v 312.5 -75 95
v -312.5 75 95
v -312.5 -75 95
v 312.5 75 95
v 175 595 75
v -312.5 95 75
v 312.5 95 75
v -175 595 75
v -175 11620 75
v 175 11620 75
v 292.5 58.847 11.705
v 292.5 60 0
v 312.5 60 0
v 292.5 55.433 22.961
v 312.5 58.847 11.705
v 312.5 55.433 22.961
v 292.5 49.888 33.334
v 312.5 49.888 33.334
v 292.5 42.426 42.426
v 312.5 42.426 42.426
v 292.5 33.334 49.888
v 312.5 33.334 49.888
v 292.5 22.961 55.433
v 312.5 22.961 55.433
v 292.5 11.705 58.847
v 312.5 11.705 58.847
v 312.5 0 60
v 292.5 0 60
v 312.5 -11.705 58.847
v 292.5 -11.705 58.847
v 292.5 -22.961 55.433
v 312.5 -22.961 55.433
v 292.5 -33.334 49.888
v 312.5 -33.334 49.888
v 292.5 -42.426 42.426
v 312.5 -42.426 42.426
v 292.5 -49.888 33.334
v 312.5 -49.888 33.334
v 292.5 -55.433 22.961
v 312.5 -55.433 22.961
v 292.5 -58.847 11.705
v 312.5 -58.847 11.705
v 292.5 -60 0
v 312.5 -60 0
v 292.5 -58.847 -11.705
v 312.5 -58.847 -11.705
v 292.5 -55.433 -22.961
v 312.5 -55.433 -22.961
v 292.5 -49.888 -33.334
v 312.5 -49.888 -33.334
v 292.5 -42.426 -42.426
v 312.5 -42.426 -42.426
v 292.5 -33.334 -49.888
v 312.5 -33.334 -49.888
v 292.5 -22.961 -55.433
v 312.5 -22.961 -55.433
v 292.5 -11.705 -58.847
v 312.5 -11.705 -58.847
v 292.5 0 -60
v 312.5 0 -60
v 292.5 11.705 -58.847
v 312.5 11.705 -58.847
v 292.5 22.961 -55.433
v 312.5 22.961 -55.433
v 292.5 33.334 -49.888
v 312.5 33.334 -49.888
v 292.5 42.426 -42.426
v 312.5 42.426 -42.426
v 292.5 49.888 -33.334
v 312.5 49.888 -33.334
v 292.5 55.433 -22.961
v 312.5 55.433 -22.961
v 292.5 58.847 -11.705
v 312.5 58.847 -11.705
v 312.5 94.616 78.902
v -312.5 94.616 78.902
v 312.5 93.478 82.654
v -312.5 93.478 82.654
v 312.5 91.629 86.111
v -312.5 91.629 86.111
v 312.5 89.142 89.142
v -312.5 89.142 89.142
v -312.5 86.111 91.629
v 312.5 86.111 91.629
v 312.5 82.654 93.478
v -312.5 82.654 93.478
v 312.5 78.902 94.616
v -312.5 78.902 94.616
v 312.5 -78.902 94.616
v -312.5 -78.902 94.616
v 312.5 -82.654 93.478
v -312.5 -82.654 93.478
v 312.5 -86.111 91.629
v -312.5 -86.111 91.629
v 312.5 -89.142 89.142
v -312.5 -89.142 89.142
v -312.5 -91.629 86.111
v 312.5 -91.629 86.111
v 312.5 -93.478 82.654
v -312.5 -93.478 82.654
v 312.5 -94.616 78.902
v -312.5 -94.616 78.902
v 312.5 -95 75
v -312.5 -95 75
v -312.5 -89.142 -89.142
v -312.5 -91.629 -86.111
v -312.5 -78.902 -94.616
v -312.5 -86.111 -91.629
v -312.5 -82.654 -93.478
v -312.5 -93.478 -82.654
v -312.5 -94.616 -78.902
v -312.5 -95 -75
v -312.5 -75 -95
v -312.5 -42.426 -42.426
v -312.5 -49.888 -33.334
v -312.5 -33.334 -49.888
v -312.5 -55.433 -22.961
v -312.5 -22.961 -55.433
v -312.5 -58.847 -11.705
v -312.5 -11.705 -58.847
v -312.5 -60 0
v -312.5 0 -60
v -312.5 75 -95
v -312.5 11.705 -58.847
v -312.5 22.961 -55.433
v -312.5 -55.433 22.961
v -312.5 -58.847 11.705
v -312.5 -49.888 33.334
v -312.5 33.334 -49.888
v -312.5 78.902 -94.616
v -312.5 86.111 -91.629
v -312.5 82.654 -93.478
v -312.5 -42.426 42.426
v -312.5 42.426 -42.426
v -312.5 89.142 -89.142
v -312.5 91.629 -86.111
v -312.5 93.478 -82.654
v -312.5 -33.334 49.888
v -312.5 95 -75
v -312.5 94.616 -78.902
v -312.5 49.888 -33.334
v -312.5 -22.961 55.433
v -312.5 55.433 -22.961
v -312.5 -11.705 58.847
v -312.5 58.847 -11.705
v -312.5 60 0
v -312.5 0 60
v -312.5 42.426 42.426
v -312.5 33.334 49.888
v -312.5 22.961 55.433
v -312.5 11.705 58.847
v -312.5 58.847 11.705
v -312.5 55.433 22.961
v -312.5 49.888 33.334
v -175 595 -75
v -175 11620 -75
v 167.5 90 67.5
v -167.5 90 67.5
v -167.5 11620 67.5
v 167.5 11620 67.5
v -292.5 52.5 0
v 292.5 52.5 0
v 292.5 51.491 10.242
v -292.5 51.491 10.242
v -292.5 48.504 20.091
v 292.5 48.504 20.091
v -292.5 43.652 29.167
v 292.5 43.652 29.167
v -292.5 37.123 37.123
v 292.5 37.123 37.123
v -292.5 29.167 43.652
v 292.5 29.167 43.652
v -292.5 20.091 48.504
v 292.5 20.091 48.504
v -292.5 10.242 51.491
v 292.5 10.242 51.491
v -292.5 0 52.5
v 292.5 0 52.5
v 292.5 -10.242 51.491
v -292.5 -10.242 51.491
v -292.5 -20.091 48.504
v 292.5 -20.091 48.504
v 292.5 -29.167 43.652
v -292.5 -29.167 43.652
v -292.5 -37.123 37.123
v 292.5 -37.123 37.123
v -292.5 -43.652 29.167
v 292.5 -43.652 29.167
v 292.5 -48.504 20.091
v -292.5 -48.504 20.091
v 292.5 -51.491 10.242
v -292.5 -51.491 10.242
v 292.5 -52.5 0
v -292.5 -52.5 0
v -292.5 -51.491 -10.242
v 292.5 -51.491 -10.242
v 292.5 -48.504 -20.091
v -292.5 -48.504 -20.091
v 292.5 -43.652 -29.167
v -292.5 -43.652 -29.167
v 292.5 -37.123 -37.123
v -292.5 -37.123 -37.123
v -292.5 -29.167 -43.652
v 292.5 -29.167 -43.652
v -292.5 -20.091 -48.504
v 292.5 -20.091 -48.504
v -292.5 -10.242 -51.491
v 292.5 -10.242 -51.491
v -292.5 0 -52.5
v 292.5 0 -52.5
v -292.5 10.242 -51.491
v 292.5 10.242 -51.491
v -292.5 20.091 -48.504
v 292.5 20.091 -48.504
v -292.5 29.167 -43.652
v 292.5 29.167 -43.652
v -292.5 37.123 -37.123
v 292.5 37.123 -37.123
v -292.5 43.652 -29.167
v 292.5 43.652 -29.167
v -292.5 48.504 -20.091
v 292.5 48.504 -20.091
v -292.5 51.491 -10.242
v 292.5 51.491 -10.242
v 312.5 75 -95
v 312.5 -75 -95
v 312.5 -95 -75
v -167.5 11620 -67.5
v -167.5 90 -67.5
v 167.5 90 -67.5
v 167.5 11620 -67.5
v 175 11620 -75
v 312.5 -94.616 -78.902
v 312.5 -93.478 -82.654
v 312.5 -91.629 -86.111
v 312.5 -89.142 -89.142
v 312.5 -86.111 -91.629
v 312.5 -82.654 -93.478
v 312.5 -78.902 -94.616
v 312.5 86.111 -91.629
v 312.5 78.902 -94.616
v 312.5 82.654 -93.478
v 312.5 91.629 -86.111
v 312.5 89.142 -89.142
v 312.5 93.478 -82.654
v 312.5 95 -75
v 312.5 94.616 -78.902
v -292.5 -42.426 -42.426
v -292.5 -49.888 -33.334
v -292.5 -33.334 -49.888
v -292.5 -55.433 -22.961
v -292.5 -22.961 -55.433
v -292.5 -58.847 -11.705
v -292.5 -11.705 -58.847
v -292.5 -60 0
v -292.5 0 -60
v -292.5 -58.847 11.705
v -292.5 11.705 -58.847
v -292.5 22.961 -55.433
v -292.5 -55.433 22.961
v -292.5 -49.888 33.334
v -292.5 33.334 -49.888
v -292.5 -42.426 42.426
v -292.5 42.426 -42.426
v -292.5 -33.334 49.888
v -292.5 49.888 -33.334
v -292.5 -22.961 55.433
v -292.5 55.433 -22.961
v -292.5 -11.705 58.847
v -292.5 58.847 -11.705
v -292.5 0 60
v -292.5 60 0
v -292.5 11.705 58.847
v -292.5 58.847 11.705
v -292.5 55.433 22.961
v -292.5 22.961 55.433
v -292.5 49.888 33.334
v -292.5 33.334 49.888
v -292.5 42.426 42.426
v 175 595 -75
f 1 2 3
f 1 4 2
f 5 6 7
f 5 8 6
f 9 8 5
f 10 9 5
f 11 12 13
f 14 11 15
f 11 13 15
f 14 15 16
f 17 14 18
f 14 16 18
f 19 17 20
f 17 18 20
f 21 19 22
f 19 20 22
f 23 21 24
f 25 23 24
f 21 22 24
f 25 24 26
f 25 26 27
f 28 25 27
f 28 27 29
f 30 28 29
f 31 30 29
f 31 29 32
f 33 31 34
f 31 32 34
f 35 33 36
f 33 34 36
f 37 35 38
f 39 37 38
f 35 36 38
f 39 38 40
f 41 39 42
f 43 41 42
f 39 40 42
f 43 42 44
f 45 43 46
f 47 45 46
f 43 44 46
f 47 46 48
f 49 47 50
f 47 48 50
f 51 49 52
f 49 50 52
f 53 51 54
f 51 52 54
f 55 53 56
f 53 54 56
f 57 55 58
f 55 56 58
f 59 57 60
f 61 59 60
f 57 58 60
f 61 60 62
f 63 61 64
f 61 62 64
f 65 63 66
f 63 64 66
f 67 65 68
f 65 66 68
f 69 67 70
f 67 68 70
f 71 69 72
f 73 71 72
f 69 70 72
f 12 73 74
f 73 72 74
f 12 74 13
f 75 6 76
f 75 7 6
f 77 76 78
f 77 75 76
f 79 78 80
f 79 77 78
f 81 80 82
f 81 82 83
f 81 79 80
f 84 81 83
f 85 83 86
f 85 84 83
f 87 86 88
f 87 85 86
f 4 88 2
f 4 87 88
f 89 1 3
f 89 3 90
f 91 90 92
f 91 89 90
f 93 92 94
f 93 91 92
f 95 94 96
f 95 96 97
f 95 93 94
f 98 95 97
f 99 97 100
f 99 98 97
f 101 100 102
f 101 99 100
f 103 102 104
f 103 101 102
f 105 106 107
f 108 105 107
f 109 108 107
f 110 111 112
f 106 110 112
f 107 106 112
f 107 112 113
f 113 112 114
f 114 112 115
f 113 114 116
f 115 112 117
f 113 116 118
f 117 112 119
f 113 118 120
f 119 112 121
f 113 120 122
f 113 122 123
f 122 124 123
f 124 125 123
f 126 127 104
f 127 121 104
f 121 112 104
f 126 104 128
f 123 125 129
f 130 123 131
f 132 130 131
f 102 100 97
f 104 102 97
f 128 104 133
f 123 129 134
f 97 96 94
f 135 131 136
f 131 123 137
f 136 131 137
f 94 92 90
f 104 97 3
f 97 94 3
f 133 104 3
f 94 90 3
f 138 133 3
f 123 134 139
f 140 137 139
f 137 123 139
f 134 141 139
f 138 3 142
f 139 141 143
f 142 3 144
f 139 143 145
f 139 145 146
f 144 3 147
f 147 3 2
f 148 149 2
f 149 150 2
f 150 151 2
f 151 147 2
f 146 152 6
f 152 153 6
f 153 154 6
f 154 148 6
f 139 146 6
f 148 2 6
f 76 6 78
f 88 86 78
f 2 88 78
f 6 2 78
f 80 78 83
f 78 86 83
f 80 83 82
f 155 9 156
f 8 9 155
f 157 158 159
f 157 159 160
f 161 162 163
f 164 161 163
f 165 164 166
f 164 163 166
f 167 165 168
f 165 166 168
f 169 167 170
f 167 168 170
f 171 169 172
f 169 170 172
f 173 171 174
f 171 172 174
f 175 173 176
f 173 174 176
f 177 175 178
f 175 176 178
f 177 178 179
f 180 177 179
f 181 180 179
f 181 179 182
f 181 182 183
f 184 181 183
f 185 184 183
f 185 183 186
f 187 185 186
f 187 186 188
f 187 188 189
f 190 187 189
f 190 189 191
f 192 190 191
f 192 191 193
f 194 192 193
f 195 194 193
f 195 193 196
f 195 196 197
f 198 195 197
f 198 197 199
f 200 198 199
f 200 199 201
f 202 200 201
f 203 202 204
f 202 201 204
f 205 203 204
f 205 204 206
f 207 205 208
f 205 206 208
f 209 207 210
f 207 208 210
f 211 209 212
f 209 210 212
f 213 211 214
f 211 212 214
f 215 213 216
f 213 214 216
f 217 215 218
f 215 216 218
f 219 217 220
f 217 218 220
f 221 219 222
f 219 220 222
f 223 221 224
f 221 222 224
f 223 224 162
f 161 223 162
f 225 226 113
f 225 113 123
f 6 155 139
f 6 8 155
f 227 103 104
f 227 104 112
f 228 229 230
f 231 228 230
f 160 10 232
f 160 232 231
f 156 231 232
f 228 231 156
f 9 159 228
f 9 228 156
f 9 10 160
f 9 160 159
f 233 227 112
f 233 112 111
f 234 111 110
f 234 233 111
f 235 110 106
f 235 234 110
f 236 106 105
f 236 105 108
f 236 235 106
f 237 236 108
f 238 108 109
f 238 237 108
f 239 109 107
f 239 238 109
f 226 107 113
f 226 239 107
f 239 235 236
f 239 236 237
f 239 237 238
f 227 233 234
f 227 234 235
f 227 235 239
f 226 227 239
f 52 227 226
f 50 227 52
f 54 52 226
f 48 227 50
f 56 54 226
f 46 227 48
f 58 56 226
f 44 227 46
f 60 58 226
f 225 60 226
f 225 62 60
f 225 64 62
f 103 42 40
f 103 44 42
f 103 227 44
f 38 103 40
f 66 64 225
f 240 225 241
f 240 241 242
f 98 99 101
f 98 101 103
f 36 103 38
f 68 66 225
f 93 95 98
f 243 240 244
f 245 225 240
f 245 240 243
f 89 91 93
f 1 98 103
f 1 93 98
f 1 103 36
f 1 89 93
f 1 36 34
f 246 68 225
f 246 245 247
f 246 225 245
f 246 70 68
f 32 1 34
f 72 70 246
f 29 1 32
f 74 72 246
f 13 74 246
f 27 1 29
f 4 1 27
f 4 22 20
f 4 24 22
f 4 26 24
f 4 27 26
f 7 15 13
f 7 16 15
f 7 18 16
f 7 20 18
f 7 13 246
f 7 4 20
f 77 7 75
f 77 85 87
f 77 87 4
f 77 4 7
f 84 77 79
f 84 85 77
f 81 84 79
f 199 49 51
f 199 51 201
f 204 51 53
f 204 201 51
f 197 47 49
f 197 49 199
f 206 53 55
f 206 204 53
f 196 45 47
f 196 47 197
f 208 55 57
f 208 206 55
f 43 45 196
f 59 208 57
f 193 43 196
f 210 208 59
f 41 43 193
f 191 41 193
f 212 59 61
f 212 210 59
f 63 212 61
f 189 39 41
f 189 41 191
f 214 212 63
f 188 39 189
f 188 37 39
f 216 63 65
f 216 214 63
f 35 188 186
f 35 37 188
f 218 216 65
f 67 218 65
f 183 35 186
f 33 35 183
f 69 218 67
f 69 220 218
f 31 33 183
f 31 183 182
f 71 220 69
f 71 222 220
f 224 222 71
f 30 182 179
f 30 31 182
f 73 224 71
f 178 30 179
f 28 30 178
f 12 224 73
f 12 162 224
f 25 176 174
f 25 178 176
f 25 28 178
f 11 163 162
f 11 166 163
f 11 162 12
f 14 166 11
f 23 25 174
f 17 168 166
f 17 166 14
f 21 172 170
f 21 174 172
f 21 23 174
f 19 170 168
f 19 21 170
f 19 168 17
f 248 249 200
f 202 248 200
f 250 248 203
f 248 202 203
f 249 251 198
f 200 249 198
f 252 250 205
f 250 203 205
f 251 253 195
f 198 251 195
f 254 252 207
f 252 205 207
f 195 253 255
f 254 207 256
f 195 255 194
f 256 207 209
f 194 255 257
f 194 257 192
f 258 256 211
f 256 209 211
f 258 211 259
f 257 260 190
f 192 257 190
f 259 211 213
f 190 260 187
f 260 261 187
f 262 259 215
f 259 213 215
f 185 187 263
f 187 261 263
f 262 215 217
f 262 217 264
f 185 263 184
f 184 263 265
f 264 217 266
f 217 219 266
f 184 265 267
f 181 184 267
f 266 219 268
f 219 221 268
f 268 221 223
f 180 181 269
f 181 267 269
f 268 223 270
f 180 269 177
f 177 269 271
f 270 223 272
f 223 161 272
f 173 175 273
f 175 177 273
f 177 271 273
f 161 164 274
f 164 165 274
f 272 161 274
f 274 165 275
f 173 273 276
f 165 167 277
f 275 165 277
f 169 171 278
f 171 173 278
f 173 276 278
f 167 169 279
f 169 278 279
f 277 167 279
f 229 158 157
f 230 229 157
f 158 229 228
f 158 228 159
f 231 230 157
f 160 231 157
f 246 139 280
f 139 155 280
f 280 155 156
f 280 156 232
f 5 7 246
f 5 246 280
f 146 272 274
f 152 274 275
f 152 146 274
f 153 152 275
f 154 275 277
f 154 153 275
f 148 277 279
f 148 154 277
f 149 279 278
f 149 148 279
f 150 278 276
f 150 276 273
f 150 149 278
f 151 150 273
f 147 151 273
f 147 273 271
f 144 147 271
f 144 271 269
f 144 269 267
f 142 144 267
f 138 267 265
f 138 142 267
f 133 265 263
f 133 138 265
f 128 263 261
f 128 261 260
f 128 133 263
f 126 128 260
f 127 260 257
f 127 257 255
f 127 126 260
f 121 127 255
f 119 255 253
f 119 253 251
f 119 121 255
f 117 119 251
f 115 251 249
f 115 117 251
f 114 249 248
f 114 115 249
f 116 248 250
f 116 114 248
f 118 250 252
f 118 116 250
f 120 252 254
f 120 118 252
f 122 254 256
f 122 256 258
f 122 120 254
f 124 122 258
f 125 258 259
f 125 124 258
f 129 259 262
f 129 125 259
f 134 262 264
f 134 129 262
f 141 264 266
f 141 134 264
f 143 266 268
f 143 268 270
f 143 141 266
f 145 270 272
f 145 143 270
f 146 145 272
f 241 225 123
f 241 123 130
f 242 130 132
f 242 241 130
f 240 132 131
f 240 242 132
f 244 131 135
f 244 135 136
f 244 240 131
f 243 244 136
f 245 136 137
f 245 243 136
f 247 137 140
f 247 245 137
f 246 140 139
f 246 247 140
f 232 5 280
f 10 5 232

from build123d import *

# Parameters (mm, degrees)
F0_R     = 60
F0_R_2   = 53.033
F1_DEPTH = 312.5
F2_R     = 52.5
F3_DEPTH = 625.001
F2_R_2   = 60
F4_DEPTH = 20
F6_DEPTH = 75
F8_W     = 335
F8_H     = 135
F9_DEPTH = 11530.001


# Not quite as in the source:
# - a pattern or mirror of a feature is missing from the dataset's text; its kind, count and spacing are read off the source's solid


with BuildPart() as f1:
    # F0 (on Right) → F1 (new body, symmetric)
    with BuildSketch(Plane.YZ):
        with BuildLine():
            Line((75, 95), (-75, 95))
            ThreePointArc((-75, 95), (-89.1421356237, 89.1421356237), (-95, 75))
            Line((-95, 75), (-95, -75))
            ThreePointArc((-95, -75), (-89.1421356237, -89.1421356237), (-75, -95))
            Line((-75, -95), (75, -95))
            ThreePointArc((75, -95), (89.1421356237, -89.1421356237), (95, -75))
            Line((95, -75), (95, 75))
            ThreePointArc((95, 75), (89.1421356237, 89.1421356237), (75, 95))
        make_face()
        Circle(F0_R, mode=Mode.SUBTRACT)
        Circle(F0_R)
        Circle(F0_R_2, mode=Mode.SUBTRACT)
        Circle(F0_R_2)
    extrude(amount=F1_DEPTH, both=True)

    # F2 (on face) → F3 (cut, through all)
    with BuildSketch(Plane.YZ.offset(312.5)):
        Circle(F2_R)
    extrude(amount=-F3_DEPTH, mode=Mode.SUBTRACT)

    # F2 (on face) → F4 (cut)
    with BuildSketch(Plane.YZ.offset(312.5)):
        Circle(F2_R_2)
        Circle(F2_R, mode=Mode.SUBTRACT)
    f4 = extrude(amount=-F4_DEPTH, mode=Mode.SUBTRACT)

    # F4_copies: F4 across plane
    add(f4.mirror(Plane(origin=(0, 0, 0), x_dir=(0, 0, -1), z_dir=(-1, 0, 0))), mode=Mode.SUBTRACT)

    # F5 (on Top) → F6 (join, symmetric)
    with BuildSketch(Plane.XY):
        Polygon((-312.5, 95), (312.5, 95), (175, 595), (175, 11620), (0, 11620), (-175, 11620), (-175, 595), align=None)
    extrude(amount=F6_DEPTH, both=True)

    # F8 (on offset) → F9 (cut, through all)
    with BuildSketch(Plane.XZ.offset(-90)):
        Rectangle(F8_W, F8_H)
    extrude(amount=-F9_DEPTH, mode=Mode.SUBTRACT)


solid = f1.part
